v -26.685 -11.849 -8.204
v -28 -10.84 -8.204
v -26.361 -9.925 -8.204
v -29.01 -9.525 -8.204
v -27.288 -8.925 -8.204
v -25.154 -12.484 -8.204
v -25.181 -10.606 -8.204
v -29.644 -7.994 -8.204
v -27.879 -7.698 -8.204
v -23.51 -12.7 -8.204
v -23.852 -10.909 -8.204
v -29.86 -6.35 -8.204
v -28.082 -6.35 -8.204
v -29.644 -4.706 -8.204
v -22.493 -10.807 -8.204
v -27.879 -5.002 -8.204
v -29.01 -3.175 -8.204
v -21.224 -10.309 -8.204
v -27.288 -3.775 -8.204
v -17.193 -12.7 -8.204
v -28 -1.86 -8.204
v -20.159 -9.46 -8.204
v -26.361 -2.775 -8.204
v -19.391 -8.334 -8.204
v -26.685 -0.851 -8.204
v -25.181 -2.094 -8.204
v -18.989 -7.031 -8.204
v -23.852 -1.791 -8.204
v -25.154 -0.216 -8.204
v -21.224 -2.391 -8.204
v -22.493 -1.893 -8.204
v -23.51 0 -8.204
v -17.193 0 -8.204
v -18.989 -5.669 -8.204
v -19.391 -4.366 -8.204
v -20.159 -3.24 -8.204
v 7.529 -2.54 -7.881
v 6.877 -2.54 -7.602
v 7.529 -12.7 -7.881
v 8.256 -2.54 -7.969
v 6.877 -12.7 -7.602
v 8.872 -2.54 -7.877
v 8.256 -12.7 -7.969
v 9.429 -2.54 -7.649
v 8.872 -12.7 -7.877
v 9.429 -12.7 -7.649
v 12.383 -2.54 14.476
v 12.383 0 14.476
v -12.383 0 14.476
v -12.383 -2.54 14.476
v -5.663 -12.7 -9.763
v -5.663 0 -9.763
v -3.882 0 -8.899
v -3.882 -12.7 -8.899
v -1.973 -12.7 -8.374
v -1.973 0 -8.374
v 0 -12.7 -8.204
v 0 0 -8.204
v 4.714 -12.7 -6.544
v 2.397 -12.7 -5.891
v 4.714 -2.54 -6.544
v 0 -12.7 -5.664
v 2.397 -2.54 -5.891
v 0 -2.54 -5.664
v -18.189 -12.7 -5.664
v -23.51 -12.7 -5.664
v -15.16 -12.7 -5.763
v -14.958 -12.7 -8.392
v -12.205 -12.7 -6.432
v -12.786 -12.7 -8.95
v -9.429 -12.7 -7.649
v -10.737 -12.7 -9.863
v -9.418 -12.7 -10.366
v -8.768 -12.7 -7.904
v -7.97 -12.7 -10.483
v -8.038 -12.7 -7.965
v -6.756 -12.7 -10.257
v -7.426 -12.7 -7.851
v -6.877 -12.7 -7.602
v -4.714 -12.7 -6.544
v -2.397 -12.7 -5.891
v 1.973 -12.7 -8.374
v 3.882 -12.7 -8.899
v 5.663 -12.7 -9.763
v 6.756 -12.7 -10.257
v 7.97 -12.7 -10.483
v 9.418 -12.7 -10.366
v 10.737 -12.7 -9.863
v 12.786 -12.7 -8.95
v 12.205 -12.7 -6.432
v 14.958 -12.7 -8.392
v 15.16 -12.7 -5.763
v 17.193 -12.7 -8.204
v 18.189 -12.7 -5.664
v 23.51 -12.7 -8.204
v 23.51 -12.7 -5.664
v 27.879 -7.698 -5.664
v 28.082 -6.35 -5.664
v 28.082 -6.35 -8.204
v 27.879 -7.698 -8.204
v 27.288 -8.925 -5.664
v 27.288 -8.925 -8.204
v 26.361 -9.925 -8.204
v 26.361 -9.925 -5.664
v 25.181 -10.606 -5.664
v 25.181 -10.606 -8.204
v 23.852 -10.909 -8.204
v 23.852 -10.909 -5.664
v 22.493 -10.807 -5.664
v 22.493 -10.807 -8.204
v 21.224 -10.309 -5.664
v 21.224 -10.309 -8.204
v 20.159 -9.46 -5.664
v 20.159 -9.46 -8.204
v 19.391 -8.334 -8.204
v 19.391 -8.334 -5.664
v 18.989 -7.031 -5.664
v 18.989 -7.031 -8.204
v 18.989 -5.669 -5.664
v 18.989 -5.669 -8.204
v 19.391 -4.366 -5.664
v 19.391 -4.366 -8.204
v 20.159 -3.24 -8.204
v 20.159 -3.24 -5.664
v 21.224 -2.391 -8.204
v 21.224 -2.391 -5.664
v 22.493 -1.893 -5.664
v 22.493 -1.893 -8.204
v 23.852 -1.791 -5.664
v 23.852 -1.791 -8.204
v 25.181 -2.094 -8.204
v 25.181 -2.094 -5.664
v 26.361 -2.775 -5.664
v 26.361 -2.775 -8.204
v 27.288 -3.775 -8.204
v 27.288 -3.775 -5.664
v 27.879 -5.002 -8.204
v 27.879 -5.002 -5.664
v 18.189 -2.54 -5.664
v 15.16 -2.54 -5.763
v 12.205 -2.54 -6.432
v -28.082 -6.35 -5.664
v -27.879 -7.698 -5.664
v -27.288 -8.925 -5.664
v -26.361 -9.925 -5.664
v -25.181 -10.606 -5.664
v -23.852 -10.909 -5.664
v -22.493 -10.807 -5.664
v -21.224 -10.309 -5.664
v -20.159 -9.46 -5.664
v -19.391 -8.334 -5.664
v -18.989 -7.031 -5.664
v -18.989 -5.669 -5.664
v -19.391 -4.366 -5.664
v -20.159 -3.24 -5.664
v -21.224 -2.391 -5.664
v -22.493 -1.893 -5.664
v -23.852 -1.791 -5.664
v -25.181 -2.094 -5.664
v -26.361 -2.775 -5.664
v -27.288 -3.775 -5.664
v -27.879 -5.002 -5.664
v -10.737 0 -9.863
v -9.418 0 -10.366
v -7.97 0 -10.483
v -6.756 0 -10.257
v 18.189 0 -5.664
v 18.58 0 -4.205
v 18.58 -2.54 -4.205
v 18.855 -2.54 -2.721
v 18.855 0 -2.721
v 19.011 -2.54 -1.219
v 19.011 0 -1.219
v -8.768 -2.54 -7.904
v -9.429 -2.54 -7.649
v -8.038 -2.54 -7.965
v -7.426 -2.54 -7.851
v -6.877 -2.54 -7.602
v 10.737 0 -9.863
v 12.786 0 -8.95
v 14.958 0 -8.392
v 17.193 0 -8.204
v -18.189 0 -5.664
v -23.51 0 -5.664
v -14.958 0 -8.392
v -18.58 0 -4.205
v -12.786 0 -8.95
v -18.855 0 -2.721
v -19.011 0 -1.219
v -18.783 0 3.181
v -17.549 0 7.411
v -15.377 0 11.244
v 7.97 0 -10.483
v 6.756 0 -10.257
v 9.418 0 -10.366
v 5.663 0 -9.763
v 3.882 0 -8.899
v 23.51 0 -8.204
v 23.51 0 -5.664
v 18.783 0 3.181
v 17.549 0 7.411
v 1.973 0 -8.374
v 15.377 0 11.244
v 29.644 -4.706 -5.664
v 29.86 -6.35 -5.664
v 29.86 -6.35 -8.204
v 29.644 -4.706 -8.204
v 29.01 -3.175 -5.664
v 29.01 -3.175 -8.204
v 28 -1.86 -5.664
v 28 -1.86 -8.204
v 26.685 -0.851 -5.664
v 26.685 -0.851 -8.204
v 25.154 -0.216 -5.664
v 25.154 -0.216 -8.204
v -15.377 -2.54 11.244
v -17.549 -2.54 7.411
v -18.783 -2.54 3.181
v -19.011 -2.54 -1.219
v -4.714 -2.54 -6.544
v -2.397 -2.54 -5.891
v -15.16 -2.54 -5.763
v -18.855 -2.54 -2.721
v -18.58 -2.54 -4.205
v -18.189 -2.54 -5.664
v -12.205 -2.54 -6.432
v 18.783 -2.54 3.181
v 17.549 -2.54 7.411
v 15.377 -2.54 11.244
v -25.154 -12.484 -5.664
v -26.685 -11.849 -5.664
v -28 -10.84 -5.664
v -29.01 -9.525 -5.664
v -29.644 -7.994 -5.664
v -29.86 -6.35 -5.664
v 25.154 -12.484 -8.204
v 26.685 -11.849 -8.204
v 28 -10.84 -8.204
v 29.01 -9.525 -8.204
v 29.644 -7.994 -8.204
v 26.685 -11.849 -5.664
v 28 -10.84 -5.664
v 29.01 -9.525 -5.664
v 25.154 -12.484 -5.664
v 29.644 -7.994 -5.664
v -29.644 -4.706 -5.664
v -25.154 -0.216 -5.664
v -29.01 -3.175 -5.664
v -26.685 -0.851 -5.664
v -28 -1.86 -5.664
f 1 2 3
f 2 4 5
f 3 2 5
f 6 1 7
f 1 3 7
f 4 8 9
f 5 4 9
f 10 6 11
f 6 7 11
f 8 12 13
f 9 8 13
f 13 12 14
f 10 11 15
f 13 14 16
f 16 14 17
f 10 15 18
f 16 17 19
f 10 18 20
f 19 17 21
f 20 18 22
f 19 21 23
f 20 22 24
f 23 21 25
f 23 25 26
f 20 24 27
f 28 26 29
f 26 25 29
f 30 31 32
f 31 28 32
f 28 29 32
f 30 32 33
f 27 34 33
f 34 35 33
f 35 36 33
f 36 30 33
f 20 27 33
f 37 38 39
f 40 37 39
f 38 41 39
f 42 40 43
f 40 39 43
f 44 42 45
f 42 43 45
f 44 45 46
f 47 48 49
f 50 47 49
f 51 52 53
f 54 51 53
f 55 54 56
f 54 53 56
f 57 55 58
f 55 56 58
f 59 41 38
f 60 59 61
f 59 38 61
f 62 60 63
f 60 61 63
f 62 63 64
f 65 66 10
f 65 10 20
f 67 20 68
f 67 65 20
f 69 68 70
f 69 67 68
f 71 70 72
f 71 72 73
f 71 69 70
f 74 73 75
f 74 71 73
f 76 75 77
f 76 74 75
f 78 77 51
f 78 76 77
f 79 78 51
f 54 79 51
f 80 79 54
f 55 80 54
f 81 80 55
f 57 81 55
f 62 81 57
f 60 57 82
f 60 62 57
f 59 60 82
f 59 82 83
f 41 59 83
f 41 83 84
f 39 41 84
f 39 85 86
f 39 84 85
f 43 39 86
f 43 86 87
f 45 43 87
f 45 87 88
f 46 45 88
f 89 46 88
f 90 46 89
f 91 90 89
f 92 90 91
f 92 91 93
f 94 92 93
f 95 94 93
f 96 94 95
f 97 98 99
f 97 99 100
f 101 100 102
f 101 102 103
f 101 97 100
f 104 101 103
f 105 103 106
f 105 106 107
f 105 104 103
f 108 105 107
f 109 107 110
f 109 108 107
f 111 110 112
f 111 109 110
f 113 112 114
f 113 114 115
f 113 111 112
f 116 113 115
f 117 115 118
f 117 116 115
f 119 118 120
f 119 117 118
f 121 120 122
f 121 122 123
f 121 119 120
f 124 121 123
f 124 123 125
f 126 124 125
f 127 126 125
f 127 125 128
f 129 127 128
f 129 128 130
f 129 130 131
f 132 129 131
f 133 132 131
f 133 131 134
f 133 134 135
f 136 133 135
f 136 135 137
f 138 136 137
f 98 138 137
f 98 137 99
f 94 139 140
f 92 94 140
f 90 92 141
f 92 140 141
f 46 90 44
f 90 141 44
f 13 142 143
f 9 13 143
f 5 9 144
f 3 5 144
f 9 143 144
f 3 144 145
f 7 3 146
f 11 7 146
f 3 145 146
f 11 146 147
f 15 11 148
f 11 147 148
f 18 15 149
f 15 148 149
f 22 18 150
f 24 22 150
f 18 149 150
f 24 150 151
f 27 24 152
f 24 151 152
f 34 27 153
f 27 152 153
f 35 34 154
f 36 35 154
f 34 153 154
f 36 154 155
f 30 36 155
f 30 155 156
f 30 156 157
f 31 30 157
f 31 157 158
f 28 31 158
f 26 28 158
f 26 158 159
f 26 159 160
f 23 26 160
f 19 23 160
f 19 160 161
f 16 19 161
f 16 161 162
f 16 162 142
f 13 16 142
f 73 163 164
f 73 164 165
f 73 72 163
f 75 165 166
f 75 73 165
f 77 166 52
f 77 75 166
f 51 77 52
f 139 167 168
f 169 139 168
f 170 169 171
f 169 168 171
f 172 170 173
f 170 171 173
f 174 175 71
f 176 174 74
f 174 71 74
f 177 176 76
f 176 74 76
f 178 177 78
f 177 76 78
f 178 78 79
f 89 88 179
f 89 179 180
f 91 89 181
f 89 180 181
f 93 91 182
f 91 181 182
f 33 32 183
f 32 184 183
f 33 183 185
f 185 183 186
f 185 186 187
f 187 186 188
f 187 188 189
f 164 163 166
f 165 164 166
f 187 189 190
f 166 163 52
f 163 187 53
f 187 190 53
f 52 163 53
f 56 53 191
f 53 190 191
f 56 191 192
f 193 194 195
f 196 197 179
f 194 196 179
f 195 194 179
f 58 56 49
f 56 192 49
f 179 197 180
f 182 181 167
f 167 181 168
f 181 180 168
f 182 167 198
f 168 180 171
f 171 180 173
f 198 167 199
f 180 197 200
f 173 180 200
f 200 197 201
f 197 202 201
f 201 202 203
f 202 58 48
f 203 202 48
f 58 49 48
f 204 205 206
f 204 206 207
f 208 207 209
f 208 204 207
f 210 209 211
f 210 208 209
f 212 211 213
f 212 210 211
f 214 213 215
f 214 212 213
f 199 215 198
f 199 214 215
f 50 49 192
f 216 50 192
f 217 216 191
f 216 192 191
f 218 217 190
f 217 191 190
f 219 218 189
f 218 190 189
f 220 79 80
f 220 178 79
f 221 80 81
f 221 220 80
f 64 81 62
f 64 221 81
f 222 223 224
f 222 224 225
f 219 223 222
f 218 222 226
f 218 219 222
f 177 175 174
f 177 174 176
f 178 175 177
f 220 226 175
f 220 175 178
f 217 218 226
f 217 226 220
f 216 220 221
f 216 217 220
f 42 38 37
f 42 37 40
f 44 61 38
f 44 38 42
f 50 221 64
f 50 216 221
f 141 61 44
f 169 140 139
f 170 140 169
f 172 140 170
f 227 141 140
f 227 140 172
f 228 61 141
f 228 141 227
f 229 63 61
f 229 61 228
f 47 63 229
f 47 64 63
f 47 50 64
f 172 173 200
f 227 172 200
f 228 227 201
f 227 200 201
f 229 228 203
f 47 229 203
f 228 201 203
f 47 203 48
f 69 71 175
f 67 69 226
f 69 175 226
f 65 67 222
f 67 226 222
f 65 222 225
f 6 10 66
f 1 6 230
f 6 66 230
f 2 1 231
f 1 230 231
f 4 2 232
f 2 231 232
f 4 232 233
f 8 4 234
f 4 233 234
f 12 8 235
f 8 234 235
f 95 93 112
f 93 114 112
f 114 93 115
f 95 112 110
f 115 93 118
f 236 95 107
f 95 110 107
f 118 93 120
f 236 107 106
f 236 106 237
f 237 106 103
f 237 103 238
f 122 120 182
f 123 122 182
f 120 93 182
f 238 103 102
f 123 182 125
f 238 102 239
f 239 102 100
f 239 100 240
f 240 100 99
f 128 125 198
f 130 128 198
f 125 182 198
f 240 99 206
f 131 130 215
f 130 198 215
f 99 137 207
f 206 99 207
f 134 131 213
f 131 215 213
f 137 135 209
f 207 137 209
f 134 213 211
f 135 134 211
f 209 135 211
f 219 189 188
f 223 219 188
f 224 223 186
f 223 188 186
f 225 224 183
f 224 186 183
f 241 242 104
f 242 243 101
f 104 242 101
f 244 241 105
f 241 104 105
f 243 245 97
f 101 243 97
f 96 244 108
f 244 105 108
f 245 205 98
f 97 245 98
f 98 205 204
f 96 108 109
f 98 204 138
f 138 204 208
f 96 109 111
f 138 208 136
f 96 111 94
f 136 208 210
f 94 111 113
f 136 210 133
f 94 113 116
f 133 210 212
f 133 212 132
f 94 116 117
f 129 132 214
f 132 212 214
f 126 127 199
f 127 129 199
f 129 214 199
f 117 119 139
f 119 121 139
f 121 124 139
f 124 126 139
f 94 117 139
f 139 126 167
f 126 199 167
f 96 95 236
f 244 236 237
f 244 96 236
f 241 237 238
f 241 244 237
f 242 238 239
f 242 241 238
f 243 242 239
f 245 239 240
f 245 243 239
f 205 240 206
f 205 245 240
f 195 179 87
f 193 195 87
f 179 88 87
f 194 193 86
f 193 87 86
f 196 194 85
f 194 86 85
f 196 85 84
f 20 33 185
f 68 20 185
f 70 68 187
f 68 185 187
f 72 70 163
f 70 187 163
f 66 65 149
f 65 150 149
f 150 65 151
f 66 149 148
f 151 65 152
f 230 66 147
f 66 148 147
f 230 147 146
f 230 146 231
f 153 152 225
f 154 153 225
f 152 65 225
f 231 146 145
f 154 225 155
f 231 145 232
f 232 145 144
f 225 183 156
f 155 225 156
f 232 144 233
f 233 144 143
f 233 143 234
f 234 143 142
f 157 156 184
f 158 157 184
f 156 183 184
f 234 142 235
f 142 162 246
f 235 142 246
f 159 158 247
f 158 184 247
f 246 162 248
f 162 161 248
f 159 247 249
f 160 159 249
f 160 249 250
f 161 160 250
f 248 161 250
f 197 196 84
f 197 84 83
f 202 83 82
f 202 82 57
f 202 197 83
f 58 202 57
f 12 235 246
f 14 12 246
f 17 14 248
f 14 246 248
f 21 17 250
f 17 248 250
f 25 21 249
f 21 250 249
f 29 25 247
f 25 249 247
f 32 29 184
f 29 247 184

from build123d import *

# Parameters (mm, degrees)
F1_DEPTH = 2.54
F2_DEPTH = 12.7
F3_R     = 5.08
F5_DEPTH = 25.4
F7_R     = 2.54


with BuildPart() as f1:
    # F0 (on Front) → F1 (new body)
    with BuildSketch(Plane.XZ):
        with BuildLine():
            Line((12.3829699, 14.4763447201), (-12.3829699, 14.4763447201))
            ThreePointArc((-12.3829699, 14.4763447201), (-17.5494163181, 7.4108357757), (-19.0109455672, -1.2192))
            ThreePointArc((-19.0109455672, -1.2192), (-18.7320588508, -3.4659012121), (-18.1886103823, -5.6636518574))
            ThreePointArc((-18.1886103823, -5.6636518574), (-12.9594922672, -6.2044133907), (-8.1898528707, -8.414987824))
            ThreePointArc((-8.1898528707, -8.414987824), (-0.0244050051, -5.6637208939), (8.1261735346, -8.4587303814))
            ThreePointArc((8.1261735346, -8.4587303814), (12.9222610069, -6.2147067253), (18.1886103823, -5.6636518574))
            ThreePointArc((18.1886103823, -5.6636518574), (18.7320588508, -3.4659012121), (19.0109455672, -1.2192))
            ThreePointArc((19.0109455672, -1.2192), (17.5494163181, 7.4108357757), (12.3829699, 14.4763447201))
        make_face()
    extrude(amount=F1_DEPTH)

    # F0 (on Front) → F2 (join)
    with BuildSketch(Plane.XZ):
        with BuildLine():
            ThreePointArc((-8.1898528707, -8.414987824), (-12.9594922672, -6.2044133907), (-18.1886103823, -5.6636518574))
            Line((-18.1886103823, -5.6636518574), (-29.86024, -5.6636518574))
            Line((-29.86024, -5.6636518574), (-29.86024, -8.2036518574))
            Line((-29.86024, -8.2036518574), (-17.1930973418, -8.2036518574))
            ThreePointArc((-17.1930973418, -8.2036518574), (-12.3090033163, -9.1264565308), (-8.0982998954, -11.7676531566))
            ThreePointArc((-8.0982998954, -11.7676531566), (-0.0191744615, -8.2037507277), (8.0326972664, -11.8288065861))
            ThreePointArc((8.0326972664, -11.8288065861), (12.2672793977, -9.1428876591), (17.1930973418, -8.2036518574))
            Line((17.1930973418, -8.2036518574), (29.86024, -8.2036518574))
            Line((29.86024, -8.2036518574), (29.86024, -5.6636518574))
            Line((29.86024, -5.6636518574), (18.1886103823, -5.6636518574))
            ThreePointArc((18.1886103823, -5.6636518574), (12.9222610069, -6.2147067253), (8.1261735346, -8.4587303814))
            ThreePointArc((8.1261735346, -8.4587303814), (-0.0244050051, -5.6637208939), (-8.1898528707, -8.414987824))
        make_face()
    extrude(amount=F2_DEPTH)

    # F3
    f3_edges = [f1.edges().sort_by_distance(p)[0] for p in [
        (-8.0983, -6.35, -11.767653),
        (8.032697, -6.35, -11.828807),
    ]]
    fillet(f3_edges, radius=F3_R)

    # F4 (on face) → F5 (cut)
    with BuildSketch(Plane.XY.offset(-5.6636518574)):
        with BuildLine():
            ThreePointArc((-18.93824, -6.35), (-23.51024, -1.778), (-28.08224, -6.35))
            ThreePointArc((-28.08224, -6.35), (-23.51024, -10.922), (-18.93824, -6.35))
        make_face()
        with BuildLine():
            Line((-29.86024, 0), (-29.86024, -6.35))
            ThreePointArc((-29.86024, -6.35), (-28.0003680605, -1.8598719395), (-23.51024, 0))
            Line((-23.51024, 0), (-29.86024, 0))
        make_face()
        with BuildLine():
            ThreePointArc((-23.51024, -12.7), (-28.0003680605, -10.8401280605), (-29.86024, -6.35))
            Line((-29.86024, -6.35), (-29.86024, -12.7))
            Line((-29.86024, -12.7), (-23.51024, -12.7))
        make_face()
    extrude(amount=-F5_DEPTH, mode=Mode.SUBTRACT)

    # F6: F1 across plane


with BuildPart() as f1_1:
    add(f1.part)
    add(f1.part.mirror(Plane.YZ), mode=Mode.INTERSECT)

    # F7
    f7_edges = [f1_1.edges().sort_by_distance(p)[0] for p in [
        (-8.126174, -7.62, -8.45873),
        (8.126174, -7.62, -8.45873),
    ]]
    fillet(f7_edges, radius=F7_R)


solid = f1_1.part
